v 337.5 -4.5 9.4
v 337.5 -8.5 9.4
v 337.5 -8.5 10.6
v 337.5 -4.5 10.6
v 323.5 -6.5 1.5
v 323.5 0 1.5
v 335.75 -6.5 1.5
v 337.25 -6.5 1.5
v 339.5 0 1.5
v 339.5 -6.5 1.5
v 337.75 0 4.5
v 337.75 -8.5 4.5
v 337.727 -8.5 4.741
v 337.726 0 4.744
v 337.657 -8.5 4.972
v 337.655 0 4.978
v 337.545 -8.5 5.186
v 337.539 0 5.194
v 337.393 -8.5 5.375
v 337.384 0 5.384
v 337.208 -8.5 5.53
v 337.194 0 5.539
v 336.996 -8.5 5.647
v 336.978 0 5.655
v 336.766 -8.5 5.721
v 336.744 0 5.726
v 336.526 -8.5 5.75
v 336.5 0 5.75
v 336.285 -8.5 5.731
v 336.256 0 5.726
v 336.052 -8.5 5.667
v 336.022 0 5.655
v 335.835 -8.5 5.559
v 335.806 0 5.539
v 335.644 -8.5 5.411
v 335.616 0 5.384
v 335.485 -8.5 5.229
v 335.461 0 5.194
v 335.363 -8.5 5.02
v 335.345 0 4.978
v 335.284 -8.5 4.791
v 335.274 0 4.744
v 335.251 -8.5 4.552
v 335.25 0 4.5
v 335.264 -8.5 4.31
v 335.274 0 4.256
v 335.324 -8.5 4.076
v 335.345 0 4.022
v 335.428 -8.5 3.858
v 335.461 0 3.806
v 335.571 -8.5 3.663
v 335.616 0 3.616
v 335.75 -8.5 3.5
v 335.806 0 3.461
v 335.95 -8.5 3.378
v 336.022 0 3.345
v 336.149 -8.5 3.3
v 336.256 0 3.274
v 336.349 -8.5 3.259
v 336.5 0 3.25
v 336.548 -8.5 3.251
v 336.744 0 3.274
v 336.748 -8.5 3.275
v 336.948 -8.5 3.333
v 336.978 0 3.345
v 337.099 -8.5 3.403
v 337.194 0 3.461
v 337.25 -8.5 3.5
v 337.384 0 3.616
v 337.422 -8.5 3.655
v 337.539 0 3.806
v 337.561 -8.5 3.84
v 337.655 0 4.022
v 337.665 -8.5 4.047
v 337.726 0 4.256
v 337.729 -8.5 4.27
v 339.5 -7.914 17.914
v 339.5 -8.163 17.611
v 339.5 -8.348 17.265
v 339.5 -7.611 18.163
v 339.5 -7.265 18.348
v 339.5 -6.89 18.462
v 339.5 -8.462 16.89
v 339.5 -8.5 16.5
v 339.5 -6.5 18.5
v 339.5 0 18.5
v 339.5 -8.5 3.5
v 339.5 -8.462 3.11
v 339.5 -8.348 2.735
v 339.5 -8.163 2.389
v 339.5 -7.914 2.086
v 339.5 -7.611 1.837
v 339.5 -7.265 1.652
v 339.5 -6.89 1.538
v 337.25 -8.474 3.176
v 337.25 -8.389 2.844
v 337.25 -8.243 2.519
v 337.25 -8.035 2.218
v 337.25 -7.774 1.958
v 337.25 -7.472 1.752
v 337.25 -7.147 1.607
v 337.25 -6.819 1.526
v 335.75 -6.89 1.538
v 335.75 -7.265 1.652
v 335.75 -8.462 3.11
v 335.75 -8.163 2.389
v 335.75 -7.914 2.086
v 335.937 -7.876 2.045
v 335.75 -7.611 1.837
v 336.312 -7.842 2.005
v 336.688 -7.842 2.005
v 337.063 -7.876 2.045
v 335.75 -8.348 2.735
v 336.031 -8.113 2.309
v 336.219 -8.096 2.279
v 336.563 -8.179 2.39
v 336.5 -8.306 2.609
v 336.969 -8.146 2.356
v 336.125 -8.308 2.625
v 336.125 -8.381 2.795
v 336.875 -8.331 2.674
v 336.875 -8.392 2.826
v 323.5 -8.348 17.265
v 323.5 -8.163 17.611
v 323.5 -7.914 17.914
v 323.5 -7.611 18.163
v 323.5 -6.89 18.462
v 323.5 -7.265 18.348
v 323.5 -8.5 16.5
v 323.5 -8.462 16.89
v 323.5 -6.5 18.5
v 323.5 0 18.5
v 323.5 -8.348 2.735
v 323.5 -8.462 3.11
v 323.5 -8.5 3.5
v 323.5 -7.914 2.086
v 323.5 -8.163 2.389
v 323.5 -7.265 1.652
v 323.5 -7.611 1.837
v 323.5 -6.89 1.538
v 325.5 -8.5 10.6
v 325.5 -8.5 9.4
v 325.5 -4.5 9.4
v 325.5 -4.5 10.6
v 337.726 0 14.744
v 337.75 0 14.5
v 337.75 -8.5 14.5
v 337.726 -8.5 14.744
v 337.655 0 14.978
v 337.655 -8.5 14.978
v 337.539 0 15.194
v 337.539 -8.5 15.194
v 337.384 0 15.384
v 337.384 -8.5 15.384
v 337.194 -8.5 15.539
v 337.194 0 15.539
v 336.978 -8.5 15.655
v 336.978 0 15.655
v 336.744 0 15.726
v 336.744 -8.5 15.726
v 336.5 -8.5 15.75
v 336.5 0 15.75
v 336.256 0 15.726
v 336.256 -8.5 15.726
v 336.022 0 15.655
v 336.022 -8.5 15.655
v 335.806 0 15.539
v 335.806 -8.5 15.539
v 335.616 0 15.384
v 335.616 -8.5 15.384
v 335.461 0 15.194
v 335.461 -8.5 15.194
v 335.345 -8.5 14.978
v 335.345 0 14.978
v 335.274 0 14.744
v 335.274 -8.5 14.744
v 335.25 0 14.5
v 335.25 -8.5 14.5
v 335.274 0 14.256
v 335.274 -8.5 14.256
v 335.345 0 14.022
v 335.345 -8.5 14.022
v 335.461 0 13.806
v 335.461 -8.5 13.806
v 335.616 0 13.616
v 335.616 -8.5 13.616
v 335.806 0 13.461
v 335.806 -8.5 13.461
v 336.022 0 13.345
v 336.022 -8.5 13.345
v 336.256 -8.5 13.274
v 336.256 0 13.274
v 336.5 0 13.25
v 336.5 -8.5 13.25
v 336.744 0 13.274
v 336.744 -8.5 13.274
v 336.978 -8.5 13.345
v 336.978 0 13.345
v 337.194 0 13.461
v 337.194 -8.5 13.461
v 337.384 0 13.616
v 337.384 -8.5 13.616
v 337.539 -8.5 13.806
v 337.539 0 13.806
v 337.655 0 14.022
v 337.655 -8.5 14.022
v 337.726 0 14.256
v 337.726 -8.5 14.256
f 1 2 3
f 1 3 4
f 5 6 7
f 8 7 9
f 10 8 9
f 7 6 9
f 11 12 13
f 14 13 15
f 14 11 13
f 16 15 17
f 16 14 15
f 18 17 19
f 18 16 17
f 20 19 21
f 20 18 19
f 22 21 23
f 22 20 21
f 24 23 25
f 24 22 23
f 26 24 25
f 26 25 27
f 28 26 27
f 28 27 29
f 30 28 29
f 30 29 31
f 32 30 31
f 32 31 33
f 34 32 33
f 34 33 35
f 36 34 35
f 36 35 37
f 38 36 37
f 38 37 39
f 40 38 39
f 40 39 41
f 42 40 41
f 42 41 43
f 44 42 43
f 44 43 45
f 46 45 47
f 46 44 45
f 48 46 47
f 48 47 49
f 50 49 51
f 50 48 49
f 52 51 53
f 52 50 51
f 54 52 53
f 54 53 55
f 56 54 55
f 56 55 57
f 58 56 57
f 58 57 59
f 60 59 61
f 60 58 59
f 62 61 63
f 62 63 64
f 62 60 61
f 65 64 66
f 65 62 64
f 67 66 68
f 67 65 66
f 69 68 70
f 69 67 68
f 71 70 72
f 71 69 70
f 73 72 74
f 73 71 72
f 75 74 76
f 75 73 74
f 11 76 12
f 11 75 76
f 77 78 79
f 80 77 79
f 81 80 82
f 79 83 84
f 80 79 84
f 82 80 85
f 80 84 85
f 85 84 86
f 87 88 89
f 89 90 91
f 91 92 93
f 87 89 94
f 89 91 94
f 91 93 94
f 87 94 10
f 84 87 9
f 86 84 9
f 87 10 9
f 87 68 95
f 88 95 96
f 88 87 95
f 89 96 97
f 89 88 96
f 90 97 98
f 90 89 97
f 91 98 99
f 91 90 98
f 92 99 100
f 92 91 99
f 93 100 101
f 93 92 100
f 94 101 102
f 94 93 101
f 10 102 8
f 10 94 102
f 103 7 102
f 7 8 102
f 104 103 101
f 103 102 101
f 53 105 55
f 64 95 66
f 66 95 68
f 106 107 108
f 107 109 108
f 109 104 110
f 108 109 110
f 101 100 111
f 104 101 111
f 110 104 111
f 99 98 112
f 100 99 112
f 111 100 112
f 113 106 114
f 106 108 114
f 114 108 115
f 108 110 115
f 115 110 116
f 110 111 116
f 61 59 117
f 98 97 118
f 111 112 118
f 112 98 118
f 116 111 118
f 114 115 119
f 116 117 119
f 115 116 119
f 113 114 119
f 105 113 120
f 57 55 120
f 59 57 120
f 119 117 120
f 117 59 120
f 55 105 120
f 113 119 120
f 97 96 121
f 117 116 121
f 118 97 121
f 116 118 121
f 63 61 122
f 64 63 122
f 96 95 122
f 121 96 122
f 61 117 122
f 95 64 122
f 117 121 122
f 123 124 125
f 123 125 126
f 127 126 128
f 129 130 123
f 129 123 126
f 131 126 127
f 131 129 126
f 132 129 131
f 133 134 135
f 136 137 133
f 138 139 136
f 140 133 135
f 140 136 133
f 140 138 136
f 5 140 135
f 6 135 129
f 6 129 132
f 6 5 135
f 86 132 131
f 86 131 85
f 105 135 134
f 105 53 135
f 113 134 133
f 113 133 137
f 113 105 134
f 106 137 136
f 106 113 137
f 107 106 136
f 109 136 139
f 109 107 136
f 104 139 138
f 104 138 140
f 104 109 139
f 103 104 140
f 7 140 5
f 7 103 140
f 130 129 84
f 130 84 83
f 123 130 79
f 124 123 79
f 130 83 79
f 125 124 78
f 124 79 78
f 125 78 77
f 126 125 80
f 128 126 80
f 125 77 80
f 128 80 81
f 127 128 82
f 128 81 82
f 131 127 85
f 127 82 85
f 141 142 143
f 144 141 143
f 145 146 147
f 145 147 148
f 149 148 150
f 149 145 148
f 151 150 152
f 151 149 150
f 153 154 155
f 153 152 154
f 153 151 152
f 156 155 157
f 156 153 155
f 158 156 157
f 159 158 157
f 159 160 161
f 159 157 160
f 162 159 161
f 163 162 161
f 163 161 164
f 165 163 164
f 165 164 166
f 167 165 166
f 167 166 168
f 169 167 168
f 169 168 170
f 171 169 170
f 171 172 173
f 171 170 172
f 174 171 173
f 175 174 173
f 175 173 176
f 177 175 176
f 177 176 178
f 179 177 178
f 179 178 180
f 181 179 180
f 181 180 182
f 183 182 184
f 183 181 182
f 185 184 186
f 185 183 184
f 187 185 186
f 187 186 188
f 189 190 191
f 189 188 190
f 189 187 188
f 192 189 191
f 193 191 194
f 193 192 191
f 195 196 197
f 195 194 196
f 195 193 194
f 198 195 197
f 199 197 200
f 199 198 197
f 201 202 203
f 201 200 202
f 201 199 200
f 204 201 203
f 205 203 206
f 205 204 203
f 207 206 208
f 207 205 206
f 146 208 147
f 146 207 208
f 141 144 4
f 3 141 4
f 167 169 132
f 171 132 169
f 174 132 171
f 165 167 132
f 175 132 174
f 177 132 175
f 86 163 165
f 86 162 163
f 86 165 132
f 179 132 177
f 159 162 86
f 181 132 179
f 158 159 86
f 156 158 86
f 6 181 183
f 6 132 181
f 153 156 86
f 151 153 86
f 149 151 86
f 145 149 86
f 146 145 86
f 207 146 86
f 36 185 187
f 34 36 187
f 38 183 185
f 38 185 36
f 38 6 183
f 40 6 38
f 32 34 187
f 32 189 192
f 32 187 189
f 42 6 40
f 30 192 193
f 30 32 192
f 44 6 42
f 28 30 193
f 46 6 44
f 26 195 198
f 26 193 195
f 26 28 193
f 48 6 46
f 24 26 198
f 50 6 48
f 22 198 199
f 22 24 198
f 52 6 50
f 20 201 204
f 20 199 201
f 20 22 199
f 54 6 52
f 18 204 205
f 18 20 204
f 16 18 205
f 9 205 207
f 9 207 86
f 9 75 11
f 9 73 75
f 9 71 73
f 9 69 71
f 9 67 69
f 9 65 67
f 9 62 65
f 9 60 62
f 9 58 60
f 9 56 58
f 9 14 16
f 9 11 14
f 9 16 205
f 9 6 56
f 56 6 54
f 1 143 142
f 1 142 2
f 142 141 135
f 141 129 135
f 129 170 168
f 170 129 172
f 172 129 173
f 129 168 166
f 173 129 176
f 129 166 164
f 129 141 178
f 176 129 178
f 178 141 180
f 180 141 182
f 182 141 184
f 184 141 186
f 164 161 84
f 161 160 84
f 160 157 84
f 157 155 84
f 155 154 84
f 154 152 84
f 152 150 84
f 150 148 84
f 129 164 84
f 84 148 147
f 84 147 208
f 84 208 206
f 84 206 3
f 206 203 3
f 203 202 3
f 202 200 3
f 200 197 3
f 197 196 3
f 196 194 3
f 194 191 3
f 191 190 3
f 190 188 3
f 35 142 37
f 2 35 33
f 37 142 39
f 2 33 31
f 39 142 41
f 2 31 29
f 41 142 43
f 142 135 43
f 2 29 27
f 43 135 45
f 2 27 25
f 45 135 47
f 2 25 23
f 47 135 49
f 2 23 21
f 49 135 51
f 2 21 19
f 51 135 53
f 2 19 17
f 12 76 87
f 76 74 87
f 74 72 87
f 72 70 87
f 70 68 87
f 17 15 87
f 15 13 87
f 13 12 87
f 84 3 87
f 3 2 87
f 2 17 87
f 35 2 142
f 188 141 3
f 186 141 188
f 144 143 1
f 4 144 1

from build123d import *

# Parameters (mm, degrees)
BOX055_W          = 12
BOX055_H          = 4
BOX055_DEPTH      = 1.2
CYLINDER113_R     = 1.25
CYLINDER113_DEPTH = 10
CYLINDER112_R     = 1.25
CYLINDER112_DEPTH = 10
BOX048_W          = 16
BOX048_H          = 8.5
BOX048_DEPTH      = 17
FILLET024_R       = 2


with BuildPart() as cube034:
    # Box055 → Box055 (new body)
    with BuildSketch(Plane(origin=(325.5, 7.5, 9.4), x_dir=(1, 0, 0), z_dir=(0, 0, 1))):
        with Locations((6, 2)):
            Rectangle(BOX055_W, BOX055_H)
    extrude(amount=BOX055_DEPTH)


with BuildPart() as cylinder113:
    # Cylinder113 → Cylinder113 (new body)
    with BuildSketch(Plane(origin=(320, 26, 0), x_dir=(1, 0, 0), z_dir=(0, -1, 0))):
        Circle(CYLINDER113_R)
    extrude(amount=CYLINDER113_DEPTH)


with BuildPart() as fusion098:
    # Cylinder112 → Cylinder112 (new body)
    with BuildSketch(Plane(origin=(320, 26, 10), x_dir=(1, 0, 0), z_dir=(0, -1, 0))):
        Circle(CYLINDER112_R)
    extrude(amount=CYLINDER112_DEPTH)

    # Fusion098: union Cylinder113
    add(cylinder113.part)


with BuildPart() as fusion098_1:
    # Fusion098 placement: moved
    add(fusion098.part.moved(Location((16.5, -9.5, 4.5))))


with BuildPart() as cut062:
    # Box048 → Box048 (new body)
    with BuildSketch(Plane(origin=(323.5, 7.5, 1.5), x_dir=(1, 0, 0), z_dir=(0, 0, 1))):
        with Locations((8, 4.25)):
            Rectangle(BOX048_W, BOX048_H)
    extrude(amount=BOX048_DEPTH)

    # Cut059: cut Fusion098
    add(fusion098_1.part, mode=Mode.SUBTRACT)

    # Fillet024
    fillet024_edges = [cut062.edges().sort_by_distance(p)[0] for p in [
        (331.5, 7.5, 1.5),
        (331.5, 7.5, 18.5),
    ]]
    fillet(fillet024_edges, radius=FILLET024_R)

    # Cut062: cut Cube034
    add(cube034.part, mode=Mode.SUBTRACT)


with BuildPart() as cut062_1:
    # Cut062 placement: moved
    add(cut062.part.moved(Location((0, -16, 0))))


solid = cut062_1.part
